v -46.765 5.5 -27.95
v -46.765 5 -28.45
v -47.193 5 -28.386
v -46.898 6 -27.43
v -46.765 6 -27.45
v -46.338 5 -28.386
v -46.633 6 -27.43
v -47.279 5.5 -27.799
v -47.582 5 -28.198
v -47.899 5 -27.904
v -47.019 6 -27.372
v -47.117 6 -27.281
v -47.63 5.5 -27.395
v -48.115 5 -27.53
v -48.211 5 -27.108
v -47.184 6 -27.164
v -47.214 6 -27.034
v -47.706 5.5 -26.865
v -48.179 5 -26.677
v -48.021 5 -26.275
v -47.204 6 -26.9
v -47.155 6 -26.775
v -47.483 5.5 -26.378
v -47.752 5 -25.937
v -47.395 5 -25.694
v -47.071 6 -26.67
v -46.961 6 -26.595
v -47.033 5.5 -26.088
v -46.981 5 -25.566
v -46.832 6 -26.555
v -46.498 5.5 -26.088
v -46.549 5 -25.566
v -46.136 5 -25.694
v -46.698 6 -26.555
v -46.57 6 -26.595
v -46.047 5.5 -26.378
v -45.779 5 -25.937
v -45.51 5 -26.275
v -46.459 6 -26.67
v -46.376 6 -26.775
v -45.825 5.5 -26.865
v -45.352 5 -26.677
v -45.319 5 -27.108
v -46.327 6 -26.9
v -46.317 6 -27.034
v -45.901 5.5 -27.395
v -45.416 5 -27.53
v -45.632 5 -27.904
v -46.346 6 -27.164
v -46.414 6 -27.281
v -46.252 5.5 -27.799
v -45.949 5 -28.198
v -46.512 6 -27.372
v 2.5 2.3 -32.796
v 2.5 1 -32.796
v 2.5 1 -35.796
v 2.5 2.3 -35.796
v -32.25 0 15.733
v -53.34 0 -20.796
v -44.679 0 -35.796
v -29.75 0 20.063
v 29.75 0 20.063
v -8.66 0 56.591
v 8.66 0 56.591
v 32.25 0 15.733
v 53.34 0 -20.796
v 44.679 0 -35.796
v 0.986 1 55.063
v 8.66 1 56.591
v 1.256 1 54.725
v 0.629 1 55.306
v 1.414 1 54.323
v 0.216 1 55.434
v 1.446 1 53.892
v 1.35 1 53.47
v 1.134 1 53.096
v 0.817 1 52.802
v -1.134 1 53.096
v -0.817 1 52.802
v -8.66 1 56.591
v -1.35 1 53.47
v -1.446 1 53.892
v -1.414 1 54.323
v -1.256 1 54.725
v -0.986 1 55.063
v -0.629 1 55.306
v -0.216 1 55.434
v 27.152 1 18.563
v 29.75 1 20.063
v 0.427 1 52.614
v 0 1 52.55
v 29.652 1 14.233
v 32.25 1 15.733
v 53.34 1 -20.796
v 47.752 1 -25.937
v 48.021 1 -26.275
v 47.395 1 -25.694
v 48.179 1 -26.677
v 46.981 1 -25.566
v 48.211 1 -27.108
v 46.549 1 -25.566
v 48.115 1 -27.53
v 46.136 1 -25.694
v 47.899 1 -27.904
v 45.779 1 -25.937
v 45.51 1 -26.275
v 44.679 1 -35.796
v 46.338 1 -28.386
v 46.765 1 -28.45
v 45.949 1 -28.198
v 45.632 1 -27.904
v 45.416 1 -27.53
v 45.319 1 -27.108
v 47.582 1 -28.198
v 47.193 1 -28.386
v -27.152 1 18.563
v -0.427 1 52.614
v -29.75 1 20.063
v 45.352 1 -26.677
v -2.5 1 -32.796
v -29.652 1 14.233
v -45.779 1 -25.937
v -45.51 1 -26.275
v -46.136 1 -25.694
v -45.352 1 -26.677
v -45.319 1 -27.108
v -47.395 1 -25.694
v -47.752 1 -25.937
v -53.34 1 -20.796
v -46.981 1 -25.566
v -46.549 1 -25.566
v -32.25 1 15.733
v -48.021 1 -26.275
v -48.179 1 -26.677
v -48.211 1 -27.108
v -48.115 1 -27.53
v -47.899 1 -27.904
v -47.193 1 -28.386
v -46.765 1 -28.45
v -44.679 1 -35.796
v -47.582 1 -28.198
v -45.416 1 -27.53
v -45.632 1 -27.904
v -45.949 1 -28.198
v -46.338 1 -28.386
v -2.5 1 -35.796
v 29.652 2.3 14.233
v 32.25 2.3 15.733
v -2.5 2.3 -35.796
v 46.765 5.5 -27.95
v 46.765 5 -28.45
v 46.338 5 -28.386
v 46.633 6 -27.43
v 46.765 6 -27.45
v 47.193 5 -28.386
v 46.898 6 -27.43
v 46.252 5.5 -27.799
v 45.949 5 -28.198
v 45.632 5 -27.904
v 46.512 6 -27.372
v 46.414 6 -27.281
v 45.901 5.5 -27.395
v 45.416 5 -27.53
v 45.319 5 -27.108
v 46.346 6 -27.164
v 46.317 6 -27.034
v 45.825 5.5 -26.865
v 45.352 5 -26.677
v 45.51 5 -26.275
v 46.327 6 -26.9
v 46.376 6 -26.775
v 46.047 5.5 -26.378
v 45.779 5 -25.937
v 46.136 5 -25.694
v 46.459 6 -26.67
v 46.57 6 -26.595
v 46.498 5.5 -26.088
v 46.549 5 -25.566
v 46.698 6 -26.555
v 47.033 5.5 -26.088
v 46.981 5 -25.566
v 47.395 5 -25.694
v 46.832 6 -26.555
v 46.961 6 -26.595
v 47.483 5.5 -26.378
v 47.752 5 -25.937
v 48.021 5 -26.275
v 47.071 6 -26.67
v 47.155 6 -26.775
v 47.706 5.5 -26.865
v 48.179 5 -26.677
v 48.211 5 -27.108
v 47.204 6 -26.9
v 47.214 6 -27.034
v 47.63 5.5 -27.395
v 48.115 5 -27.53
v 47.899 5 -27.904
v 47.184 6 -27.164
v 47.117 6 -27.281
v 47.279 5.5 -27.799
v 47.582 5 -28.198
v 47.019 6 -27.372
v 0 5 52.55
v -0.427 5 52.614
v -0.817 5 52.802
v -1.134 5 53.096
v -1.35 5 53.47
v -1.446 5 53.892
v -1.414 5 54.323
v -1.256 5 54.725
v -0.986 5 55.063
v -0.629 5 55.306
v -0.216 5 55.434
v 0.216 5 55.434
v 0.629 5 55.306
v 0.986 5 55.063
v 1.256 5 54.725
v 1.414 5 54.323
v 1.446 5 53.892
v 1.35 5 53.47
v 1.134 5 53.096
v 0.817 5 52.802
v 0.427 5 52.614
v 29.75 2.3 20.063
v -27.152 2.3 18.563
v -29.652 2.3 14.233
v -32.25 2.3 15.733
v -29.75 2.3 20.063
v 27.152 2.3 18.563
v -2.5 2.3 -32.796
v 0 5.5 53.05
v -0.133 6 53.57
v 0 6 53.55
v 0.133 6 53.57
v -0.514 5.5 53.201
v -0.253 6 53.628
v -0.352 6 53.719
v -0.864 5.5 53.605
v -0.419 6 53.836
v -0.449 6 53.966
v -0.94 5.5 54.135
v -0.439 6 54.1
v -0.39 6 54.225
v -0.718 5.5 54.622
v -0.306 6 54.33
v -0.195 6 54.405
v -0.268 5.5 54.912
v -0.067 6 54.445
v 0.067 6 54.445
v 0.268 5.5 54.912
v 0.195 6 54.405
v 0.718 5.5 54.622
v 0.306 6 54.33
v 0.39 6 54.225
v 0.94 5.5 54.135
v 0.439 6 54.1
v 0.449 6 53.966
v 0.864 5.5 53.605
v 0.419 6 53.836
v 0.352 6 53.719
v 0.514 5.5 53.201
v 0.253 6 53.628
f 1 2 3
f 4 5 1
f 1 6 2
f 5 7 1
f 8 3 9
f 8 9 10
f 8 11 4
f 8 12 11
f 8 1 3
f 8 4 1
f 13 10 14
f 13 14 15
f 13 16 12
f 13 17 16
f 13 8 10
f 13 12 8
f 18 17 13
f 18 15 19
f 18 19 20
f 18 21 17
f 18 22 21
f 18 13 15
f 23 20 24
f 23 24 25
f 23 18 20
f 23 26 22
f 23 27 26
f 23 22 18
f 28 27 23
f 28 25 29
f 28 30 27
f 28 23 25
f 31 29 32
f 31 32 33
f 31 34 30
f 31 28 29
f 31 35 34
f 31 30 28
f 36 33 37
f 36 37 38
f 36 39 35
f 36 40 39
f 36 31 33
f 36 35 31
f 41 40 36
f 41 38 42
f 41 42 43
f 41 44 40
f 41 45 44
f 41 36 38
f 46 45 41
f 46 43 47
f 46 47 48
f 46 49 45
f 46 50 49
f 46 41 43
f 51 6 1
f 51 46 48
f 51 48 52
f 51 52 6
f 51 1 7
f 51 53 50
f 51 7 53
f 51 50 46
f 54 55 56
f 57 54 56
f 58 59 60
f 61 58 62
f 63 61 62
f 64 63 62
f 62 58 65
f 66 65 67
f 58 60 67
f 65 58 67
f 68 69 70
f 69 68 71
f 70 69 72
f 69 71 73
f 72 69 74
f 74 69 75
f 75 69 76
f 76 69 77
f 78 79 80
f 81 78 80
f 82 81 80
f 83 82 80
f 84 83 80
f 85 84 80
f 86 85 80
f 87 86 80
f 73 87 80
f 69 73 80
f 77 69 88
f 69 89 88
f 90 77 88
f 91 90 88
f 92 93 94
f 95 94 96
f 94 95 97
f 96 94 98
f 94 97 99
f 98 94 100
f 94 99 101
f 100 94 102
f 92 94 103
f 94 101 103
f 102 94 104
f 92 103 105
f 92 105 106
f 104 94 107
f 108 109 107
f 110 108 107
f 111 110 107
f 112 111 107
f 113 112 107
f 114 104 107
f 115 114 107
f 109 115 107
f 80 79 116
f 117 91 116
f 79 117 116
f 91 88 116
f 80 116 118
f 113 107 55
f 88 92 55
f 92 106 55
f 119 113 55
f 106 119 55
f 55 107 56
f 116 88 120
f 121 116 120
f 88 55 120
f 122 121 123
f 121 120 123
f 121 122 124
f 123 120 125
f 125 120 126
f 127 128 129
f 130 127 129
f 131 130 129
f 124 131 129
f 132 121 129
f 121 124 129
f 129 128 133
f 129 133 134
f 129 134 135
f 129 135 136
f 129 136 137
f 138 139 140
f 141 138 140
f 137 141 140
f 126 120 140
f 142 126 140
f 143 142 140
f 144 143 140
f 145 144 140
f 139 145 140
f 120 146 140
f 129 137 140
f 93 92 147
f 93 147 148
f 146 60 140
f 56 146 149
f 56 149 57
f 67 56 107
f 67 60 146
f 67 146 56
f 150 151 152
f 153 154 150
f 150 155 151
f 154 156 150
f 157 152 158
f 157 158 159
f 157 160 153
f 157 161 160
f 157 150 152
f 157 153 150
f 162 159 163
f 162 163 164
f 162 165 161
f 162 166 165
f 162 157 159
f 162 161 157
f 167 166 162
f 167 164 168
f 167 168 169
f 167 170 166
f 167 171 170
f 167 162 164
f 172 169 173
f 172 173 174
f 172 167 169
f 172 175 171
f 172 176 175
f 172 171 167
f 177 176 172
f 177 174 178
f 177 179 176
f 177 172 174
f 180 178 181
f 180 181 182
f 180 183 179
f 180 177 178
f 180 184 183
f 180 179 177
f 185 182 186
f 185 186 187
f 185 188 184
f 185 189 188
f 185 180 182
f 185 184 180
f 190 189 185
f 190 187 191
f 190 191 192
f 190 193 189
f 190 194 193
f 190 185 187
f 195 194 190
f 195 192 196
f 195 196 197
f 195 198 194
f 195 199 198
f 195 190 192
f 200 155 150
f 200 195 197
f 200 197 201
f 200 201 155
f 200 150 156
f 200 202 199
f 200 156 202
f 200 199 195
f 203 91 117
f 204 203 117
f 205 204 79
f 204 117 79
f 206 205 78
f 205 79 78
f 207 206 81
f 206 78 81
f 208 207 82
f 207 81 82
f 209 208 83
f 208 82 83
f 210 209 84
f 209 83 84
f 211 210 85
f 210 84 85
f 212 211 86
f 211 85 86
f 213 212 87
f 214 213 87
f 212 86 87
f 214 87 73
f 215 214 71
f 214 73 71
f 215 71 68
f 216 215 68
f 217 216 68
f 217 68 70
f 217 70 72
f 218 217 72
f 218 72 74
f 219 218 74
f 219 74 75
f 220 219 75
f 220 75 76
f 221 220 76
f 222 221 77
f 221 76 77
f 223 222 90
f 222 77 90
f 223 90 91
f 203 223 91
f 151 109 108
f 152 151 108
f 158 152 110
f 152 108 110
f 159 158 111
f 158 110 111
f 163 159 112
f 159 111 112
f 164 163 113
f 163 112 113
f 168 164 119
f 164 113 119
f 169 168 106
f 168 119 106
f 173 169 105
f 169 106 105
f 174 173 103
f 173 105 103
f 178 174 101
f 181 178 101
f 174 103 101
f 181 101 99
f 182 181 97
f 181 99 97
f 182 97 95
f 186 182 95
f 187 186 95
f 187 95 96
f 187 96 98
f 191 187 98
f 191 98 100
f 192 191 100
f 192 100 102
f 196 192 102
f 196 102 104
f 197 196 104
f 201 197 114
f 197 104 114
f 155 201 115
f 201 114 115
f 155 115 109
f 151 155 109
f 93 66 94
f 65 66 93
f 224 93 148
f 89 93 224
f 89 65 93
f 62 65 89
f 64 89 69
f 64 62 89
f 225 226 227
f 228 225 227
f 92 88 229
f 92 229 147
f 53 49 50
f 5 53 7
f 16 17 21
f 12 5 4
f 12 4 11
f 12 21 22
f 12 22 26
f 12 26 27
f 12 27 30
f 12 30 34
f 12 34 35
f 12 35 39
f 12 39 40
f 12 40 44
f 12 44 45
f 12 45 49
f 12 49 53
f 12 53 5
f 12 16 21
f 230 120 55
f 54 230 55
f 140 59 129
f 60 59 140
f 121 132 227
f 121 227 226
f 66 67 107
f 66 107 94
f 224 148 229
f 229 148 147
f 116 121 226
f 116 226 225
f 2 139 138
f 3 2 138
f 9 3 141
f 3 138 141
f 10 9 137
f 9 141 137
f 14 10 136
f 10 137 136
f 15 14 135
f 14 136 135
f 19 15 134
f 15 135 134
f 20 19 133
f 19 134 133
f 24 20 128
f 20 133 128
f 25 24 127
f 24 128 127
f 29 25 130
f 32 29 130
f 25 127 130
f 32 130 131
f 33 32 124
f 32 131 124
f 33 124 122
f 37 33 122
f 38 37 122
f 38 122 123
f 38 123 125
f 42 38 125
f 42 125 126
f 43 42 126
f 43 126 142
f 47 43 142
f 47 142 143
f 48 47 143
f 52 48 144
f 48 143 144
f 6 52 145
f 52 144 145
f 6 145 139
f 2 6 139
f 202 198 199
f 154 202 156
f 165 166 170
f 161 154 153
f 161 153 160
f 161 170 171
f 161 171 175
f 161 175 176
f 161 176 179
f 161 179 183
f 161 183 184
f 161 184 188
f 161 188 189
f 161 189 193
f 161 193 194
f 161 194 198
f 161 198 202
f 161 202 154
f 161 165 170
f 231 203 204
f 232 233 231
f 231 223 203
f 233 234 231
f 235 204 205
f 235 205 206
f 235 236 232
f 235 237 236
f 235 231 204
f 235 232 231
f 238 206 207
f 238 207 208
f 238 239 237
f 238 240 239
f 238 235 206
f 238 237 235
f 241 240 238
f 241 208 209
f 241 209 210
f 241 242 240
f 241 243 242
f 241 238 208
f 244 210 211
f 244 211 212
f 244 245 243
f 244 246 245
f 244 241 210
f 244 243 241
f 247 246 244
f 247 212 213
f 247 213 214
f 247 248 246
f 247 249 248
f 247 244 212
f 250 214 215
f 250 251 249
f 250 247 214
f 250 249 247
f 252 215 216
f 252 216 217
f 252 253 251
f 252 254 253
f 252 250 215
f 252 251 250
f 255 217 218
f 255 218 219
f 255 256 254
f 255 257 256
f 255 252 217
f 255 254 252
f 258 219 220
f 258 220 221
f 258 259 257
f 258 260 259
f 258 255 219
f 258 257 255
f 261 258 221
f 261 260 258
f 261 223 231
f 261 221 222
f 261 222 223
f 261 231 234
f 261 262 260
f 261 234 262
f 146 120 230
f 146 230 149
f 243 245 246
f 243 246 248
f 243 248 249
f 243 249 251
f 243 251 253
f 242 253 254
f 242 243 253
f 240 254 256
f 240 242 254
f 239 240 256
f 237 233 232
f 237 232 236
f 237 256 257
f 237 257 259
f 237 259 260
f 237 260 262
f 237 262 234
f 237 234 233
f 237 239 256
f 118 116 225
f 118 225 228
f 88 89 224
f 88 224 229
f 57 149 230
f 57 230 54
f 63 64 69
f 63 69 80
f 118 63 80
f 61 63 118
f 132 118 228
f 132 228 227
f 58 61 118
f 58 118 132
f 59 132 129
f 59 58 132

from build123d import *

# Parameters (mm, degrees)
BOSS_EXTRU_2_DEPTH      = 1
ESQUISSE3_R             = 1.45
BOSS_EXTRU_3_DEPTH      = 5
CHANFREIN1_SIZE         = 1
BOSS_EXTRU_4_DEPTH      = 1.3
BOSS_EXTRU_4_DEPTH_BACK = 1
ESQUISSE4_W             = 5
ESQUISSE4_H             = 3


with BuildPart() as part:
    # Esquisse2 → Boss.-Extru.2 (new body)
    with BuildSketch(Plane(origin=(0, 0, 0), x_dir=(1, 0, 0), z_dir=(0, 1, 0))):
        Polygon((-53.339745962, 20.79571669), (-44.679491924, 35.79571669), (44.679491924, 35.79571669), (53.339745962, 20.79571669), (8.660254038, -56.59143338), (-8.660254038, -56.59143338), align=None)
    extrude(amount=BOSS_EXTRU_2_DEPTH)

    # Esquisse3 → Boss.-Extru.3 (add)
    with BuildSketch(Plane(origin=(0, 1, 0), x_dir=(1, 0, 0), z_dir=(0, 1, 0))):
        with Locations(Location((0, -54, 0), (0, 0, 90))):
            Circle(ESQUISSE3_R)
        with Locations(Location((-46.765371804, 27, 0), (0, 0, 90))):
            Circle(ESQUISSE3_R)
        with Locations(Location((46.765371804, 27, 0), (0, 0, 90))):
            Circle(ESQUISSE3_R)
    extrude(amount=BOSS_EXTRU_3_DEPTH)

    # Chanfrein1
    chanfrein1_edges = [part.edges().sort_by_distance(p)[0] for p in [
        (0, 6, 55.45),
        (-46.765371804, 6, -25.55),
        (46.765371804, 6, -25.55),
    ]]
    chamfer(chanfrein1_edges, length=CHANFREIN1_SIZE)

    # Esquisse4 → Boss.-Extru.4 (add, two sides: drawn at the far end of the back side and taken through both)
    with BuildSketch(Plane(origin=(0, 1, 0), x_dir=(1, 0, 0), z_dir=(0, 1, 0)).offset(-BOSS_EXTRU_4_DEPTH_BACK)):
        with Locations((0, 34.29571669)):
            Rectangle(ESQUISSE4_W, ESQUISSE4_H)
        Polygon((32.25, -15.732794835), (29.75, -20.062921854), (27.151923789, -18.562921854), (29.651923789, -14.232794835), align=None)
        Polygon((-29.75, -20.062921854), (-32.25, -15.732794835), (-29.651923789, -14.232794835), (-27.151923789, -18.562921854), align=None)
    extrude(amount=BOSS_EXTRU_4_DEPTH + BOSS_EXTRU_4_DEPTH_BACK)


solid = part.part
